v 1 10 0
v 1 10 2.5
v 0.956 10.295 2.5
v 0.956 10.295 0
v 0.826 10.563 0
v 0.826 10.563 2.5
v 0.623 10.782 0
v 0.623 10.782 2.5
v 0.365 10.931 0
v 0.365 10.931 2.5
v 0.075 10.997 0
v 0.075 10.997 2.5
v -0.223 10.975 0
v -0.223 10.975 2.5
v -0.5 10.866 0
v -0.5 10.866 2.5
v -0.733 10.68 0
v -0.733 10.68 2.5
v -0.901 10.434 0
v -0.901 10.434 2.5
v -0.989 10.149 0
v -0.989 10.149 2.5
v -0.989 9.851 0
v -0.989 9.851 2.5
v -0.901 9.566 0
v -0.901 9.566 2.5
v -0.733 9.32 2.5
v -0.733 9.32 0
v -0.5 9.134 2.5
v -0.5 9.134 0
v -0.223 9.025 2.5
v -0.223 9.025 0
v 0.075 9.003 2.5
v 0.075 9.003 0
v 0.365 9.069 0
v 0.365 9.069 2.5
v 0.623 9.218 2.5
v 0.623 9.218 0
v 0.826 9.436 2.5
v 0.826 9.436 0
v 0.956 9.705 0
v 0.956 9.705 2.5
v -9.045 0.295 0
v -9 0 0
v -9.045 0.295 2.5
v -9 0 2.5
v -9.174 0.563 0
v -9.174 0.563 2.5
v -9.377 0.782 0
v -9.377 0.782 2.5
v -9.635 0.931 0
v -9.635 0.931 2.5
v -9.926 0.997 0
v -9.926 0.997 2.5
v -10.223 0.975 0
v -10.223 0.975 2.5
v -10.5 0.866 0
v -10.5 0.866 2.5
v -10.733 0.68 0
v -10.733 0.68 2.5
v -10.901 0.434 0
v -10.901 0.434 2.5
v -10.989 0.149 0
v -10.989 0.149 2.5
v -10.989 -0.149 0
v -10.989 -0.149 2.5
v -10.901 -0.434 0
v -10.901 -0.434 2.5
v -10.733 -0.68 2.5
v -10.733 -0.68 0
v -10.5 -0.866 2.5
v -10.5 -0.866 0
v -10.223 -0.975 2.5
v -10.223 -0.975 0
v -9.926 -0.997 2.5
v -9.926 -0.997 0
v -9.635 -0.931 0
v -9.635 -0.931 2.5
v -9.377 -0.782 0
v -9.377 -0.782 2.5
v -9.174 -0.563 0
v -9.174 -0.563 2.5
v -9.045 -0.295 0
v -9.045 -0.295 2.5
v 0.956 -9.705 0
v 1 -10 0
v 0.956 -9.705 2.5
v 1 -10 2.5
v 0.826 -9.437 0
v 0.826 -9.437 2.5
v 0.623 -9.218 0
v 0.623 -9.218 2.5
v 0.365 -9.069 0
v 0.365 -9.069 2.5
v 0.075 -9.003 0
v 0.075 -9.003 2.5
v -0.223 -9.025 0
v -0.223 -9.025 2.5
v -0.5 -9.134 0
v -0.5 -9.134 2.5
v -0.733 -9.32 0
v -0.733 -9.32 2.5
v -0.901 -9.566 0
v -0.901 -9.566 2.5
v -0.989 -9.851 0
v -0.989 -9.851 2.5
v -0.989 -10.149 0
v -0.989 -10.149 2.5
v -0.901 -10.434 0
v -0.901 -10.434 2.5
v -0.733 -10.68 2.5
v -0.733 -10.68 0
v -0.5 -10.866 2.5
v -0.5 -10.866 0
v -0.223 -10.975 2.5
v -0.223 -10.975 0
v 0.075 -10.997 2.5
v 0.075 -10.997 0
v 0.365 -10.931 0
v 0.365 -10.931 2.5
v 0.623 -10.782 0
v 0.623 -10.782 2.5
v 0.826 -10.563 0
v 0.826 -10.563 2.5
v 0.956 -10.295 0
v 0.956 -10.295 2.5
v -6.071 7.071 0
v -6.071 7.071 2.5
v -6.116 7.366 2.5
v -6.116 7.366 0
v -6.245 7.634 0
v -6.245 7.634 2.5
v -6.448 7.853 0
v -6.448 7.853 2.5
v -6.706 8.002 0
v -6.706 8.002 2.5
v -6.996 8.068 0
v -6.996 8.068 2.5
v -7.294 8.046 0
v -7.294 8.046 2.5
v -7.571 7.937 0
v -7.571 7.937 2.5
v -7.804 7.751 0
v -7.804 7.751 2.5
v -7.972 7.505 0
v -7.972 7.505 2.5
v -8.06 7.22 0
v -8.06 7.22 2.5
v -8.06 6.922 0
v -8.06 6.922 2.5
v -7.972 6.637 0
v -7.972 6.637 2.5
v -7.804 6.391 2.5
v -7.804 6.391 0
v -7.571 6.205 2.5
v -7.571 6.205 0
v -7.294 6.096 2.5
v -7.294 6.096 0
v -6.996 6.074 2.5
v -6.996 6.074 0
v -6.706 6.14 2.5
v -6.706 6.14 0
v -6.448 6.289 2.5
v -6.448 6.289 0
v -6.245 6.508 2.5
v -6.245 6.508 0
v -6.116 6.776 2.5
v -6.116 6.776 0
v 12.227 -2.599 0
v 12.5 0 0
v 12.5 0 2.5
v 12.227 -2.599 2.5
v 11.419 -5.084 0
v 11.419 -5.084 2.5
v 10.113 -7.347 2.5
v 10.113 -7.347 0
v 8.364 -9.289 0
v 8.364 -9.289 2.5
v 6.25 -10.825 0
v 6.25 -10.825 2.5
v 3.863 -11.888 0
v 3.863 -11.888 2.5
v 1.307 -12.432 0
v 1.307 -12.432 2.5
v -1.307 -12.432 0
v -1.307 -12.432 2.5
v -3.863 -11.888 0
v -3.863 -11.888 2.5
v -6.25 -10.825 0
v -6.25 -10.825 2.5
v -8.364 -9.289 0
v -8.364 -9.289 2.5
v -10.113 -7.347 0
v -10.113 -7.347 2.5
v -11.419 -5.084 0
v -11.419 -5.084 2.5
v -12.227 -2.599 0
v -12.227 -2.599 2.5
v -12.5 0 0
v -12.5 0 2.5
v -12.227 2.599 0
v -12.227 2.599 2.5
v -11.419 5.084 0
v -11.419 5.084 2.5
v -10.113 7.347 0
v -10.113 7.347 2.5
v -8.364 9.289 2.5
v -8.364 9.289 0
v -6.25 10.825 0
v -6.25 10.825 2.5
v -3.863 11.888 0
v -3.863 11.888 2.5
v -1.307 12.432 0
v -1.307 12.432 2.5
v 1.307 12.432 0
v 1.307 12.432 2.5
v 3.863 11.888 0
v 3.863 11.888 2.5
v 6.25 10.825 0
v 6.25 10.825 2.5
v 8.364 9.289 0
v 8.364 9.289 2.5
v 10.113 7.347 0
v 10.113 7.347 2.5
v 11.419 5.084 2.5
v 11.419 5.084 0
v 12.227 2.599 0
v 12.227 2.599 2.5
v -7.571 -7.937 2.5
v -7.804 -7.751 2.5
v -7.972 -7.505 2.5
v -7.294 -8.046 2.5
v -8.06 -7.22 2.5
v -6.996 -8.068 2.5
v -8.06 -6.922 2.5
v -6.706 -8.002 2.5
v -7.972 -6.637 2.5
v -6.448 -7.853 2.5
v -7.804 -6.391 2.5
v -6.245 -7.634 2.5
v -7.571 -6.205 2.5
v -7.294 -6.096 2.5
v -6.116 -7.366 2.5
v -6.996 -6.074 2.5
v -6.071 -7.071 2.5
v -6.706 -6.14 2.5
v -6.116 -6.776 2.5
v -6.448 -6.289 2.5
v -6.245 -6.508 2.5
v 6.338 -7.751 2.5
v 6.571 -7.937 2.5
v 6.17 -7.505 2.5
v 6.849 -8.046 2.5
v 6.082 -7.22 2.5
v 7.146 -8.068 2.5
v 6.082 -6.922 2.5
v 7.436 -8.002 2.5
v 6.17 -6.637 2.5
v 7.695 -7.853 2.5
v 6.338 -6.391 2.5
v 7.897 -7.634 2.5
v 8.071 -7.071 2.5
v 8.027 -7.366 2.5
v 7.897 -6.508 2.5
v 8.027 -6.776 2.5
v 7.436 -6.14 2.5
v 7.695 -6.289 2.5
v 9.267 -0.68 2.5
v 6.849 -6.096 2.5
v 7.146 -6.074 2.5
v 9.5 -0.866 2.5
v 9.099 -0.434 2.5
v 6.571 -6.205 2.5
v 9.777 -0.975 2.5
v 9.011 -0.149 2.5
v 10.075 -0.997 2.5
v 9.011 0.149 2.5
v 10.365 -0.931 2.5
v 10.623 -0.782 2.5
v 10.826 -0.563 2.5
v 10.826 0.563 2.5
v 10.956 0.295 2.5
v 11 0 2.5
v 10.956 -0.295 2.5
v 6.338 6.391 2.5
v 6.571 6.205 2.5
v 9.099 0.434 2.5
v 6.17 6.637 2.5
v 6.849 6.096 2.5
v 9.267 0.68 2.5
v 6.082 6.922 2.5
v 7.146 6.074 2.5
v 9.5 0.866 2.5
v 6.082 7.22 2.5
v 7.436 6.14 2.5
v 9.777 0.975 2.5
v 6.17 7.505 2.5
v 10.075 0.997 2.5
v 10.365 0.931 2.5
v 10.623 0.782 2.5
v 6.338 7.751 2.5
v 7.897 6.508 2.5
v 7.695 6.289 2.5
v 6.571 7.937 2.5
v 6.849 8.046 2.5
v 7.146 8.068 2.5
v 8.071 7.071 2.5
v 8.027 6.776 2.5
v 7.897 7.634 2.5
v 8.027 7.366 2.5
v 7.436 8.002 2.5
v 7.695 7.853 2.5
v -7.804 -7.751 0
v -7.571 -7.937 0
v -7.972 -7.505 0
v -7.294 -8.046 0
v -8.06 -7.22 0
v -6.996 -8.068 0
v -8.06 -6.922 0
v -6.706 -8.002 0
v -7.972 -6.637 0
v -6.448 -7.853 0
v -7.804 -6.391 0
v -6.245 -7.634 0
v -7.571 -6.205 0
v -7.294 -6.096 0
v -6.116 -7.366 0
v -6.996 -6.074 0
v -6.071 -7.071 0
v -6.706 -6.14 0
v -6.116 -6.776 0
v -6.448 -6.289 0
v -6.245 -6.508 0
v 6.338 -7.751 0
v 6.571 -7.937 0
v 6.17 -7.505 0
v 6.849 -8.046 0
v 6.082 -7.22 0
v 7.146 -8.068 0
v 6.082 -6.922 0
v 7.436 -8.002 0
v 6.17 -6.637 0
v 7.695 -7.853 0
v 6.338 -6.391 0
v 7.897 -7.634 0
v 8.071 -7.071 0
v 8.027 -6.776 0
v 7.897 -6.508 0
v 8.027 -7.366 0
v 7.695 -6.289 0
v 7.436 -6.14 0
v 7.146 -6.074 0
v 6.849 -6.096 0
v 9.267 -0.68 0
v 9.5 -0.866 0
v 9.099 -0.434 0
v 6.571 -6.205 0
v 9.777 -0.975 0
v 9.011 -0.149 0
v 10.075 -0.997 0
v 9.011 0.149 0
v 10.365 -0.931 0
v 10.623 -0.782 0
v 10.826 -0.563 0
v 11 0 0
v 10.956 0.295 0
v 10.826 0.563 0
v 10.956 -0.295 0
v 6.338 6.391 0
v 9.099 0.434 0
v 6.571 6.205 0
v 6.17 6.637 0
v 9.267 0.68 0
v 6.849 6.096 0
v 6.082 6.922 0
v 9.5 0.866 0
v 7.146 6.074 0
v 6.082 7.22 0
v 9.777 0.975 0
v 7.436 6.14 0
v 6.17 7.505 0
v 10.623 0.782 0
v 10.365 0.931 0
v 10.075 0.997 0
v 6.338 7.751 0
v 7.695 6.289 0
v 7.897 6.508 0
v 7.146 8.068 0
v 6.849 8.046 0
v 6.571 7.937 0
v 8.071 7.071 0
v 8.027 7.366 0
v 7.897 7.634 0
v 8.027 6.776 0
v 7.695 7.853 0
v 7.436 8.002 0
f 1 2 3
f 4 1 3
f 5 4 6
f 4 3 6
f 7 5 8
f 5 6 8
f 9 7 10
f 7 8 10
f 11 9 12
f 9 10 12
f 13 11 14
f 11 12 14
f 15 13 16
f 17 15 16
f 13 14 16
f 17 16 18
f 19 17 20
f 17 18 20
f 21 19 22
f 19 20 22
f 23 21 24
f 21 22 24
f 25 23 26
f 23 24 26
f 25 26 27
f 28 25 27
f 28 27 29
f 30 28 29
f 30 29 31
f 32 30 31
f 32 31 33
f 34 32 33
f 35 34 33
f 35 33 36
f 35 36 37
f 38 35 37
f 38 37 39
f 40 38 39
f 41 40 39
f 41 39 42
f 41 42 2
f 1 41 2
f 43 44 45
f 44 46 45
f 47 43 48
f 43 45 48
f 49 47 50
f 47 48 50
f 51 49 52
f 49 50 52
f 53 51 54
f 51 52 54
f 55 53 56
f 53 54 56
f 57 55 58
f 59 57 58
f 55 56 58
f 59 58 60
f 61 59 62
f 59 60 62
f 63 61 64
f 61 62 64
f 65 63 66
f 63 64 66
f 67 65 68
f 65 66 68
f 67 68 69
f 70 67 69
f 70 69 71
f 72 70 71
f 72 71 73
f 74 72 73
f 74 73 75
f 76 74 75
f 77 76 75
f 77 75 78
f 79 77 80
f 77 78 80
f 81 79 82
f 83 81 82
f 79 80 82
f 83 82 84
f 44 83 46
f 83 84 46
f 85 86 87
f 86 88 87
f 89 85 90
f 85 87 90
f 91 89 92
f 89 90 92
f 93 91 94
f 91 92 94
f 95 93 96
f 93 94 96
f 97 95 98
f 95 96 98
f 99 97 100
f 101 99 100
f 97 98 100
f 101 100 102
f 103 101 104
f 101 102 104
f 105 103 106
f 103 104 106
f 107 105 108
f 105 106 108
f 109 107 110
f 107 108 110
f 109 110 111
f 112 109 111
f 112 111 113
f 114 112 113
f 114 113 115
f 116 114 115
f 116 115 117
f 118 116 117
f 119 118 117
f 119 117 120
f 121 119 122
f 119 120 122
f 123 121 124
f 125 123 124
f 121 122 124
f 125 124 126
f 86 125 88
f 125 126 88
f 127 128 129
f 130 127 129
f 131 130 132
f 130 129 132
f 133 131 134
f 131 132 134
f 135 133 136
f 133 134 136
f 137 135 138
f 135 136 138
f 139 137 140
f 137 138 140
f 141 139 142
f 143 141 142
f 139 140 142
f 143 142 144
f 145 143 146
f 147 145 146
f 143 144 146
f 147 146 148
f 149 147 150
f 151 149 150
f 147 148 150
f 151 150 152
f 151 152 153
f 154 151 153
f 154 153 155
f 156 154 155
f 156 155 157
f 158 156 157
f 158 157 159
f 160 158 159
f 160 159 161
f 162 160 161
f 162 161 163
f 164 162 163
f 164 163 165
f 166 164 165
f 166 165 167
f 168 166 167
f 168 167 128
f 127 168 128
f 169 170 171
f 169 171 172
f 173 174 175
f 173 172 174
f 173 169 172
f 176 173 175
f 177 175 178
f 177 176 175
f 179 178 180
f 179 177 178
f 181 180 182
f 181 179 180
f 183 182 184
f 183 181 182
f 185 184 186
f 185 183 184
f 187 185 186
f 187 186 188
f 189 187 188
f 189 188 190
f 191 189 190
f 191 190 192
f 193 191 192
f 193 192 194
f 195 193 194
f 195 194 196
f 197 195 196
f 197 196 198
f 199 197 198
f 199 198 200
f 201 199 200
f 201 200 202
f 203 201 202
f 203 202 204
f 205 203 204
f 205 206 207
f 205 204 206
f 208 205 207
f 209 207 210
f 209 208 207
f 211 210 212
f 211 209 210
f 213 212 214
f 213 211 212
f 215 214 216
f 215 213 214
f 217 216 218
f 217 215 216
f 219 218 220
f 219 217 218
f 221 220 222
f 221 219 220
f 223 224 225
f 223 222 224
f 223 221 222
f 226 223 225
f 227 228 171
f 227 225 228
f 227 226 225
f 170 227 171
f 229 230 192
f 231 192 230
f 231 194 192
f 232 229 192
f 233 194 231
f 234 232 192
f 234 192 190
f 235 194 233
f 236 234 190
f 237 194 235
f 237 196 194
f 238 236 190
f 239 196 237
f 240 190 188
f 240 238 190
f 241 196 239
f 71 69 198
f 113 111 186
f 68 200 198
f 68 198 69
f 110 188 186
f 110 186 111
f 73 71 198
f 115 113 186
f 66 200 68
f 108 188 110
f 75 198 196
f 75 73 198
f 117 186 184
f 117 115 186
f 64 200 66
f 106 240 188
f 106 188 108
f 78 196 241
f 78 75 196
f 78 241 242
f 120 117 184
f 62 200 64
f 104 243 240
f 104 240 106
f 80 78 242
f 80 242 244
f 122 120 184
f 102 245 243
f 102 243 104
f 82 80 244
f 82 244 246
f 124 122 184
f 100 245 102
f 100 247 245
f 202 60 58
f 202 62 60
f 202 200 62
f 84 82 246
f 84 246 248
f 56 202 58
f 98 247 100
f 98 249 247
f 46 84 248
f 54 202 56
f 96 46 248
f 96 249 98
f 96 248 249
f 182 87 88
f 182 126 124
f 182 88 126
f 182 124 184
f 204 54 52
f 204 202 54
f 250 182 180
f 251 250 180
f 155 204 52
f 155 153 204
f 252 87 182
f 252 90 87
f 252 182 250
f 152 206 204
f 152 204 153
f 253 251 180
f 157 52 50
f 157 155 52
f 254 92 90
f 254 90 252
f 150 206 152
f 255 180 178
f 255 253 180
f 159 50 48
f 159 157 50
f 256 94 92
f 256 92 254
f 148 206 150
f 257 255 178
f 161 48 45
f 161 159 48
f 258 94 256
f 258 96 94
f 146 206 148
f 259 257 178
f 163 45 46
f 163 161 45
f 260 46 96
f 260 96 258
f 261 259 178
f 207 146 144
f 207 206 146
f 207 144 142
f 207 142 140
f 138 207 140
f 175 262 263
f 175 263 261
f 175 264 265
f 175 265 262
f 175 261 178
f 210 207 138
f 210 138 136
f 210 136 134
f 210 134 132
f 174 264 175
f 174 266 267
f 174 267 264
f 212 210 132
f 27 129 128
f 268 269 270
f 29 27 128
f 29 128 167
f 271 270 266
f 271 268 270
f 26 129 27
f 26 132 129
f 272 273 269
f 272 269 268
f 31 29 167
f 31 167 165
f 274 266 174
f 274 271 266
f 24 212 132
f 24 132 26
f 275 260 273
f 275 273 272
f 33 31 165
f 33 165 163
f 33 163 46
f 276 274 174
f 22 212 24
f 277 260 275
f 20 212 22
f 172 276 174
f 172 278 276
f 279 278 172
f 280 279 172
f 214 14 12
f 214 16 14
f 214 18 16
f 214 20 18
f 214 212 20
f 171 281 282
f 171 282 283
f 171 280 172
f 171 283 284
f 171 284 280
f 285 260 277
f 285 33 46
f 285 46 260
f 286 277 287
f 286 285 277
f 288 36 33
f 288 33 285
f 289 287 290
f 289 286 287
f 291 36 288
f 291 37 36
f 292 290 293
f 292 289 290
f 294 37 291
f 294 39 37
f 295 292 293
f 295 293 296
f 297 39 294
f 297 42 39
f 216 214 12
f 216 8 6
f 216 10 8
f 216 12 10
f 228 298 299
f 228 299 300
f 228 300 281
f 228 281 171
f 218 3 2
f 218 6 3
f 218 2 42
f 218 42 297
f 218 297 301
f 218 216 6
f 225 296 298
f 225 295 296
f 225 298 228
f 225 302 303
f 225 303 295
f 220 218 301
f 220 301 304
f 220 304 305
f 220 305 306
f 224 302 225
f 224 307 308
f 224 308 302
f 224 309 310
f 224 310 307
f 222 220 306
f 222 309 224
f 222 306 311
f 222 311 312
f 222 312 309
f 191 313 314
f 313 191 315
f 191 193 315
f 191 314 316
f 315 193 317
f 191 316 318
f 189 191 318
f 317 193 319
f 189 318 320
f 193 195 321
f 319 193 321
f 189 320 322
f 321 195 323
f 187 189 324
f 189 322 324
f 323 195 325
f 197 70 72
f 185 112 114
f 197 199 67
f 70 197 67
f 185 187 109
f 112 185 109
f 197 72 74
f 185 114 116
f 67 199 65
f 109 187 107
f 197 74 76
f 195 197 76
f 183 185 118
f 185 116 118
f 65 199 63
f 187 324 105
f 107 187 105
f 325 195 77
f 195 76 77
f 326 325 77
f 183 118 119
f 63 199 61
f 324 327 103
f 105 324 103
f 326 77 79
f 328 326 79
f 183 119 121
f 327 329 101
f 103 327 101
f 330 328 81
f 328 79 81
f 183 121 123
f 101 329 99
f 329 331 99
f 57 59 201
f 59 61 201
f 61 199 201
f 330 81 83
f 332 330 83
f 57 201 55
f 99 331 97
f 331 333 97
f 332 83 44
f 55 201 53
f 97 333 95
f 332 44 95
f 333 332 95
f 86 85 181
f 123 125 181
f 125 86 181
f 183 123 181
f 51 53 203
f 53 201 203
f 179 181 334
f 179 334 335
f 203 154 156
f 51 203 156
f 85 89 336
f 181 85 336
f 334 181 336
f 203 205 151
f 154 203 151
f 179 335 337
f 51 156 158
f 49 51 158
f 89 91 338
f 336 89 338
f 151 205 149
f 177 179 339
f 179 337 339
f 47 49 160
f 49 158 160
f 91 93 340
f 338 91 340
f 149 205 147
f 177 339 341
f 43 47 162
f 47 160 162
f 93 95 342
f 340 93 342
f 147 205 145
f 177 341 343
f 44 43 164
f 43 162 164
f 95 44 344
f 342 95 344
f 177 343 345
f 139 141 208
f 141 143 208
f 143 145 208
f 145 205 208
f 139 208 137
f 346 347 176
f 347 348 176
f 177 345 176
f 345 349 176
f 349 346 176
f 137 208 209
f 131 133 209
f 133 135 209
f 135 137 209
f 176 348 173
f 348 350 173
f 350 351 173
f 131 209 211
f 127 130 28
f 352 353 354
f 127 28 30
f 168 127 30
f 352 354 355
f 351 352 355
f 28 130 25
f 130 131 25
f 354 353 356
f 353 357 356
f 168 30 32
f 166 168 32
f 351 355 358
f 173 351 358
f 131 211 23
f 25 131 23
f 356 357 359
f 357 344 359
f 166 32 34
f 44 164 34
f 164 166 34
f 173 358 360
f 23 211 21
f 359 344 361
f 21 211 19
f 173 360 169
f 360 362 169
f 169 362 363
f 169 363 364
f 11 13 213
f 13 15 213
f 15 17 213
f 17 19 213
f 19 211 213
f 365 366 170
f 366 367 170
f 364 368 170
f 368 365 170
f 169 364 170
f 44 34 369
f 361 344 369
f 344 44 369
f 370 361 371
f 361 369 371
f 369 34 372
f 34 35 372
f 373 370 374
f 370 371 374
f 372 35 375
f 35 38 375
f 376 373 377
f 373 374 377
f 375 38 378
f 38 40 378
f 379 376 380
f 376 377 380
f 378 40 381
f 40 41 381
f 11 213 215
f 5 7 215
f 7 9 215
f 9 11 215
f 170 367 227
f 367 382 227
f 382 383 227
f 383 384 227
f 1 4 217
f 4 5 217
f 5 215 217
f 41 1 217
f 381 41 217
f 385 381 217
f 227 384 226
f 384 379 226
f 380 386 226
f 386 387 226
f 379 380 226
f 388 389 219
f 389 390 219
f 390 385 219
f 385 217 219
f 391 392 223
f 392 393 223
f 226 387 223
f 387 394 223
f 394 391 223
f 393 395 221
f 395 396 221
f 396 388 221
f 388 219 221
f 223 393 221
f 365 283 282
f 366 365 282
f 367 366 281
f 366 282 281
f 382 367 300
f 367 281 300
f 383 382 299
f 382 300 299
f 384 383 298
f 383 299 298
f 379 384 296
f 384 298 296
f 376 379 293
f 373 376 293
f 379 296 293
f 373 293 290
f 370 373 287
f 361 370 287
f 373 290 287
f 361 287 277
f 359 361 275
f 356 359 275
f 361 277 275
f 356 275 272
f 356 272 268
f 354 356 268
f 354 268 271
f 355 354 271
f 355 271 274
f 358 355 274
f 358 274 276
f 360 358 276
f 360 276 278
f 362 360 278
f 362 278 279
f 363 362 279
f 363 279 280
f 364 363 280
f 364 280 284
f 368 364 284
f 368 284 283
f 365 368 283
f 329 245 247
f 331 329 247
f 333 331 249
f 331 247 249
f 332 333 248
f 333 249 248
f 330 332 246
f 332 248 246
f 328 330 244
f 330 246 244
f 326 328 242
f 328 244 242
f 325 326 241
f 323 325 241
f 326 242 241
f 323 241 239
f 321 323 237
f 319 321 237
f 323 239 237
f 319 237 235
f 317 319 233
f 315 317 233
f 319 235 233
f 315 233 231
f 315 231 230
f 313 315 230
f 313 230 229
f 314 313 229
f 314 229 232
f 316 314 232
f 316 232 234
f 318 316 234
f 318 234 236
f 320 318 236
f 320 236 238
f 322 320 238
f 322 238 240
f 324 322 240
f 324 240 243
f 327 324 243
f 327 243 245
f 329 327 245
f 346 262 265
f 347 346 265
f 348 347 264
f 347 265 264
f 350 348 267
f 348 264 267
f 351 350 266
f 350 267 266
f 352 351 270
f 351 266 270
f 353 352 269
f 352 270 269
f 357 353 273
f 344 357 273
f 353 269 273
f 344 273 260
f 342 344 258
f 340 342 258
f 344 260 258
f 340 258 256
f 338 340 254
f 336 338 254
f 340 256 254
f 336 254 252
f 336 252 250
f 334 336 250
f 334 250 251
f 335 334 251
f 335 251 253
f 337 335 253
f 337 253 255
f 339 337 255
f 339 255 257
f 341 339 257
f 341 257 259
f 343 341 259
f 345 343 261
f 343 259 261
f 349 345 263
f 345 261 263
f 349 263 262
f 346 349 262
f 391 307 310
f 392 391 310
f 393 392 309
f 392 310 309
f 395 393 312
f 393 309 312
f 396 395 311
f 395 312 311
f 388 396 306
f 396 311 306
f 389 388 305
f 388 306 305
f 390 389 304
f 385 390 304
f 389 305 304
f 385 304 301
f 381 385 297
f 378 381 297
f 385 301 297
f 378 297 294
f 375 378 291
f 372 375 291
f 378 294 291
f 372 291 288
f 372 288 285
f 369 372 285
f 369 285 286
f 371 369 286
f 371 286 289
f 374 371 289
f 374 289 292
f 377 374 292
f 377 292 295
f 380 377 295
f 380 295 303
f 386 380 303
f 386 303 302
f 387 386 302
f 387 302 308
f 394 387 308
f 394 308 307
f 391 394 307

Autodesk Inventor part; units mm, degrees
ref_plane "YZ Plane" through (0, 0, 0) normal (1, 0, 0) x (0, 1, 0)
ref_plane "XZ Plane" through (0, 0, 0) normal (0, 1, 0) x (-1, 0, 0)
ref_plane "XY Plane" through (0, 0, 0) normal (0, 0, 1) x (1, 0, 0)
sketch "スケッチ1" plane through (0, 0, 0) normal (0, 0, 1) x (1, 0, 0)
  circle A0 centre (0, 0) radius 12.5
  dimension "d0" = 25
extrude "押し出し1" add sketch "スケッチ1" along normal blind 2.5
sketch "スケッチ2" plane through (0, 0, 2.5) normal (0, 0, 1) x (1, 0, 0)
  line L0 (0, 0) -> (0, 10)
  dimension "d3" = 10
sketch "スケッチ3" plane through (0, 0, 2.5) normal (0, 0, 1) x (1, 0, 0)
  circle A0 centre (0, 9.9998) radius 1
  line L0 (0, 0) -> (0, -10)
  dimension "d4" = 2
  dimension "d5" = 10
sketch "スケッチ4" plane through (0, 0, 2.5) normal (0, 0, 1) x (1, 0, 0)
  circle A0 centre (0, -10) radius 1
  point P0 (0, 0)
  dimension "d6" = 2
sketch "スケッチ5" plane through (0, 0, 2.5) normal (0, 0, 1) x (1, 0, 0)
  line L0 (0, 0) -> (-10, 0)
  dimension "d7" = 10
sketch "スケッチ6" plane through (0, 0, 2.5) normal (0, 0, 1) x (1, 0, 0)
  circle A0 centre (-10.0003, 0) radius 1
  line L0 (0, 0) -> (10, 0)
  circle A1 centre (10, 0) radius 1
  dimension "d8" = 2
  dimension "d9" = 10
  dimension "d10" = 2
extrude "押し出し2" cut sketch "スケッチ3" against normal blind 2.5
extrude "押し出し3" cut sketch "スケッチ6" against normal blind 2.5
extrude "押し出し4" cut sketch "スケッチ4" against normal blind 2.5
sketch "スケッチ7" plane through (0, 0, 2.5) normal (0, 0, 1) x (1, 0, 0)
  line L0 (0, 0) -> (7.0711, 7.0711)
  line L1 (0, 0) -> (10, 0) construction
  line L2 (0, 0) -> (-7.0711, 7.0711)
  line L3 (0, 0) -> (10, 0) construction
  circle A0 centre (-7.0711, 7.0711) radius 1
  circle A1 centre (7.0711, 7.0711) radius 1
  dimension "d17" = 10
  dimension "d18" = 45
  dimension "d19" = 10
  dimension "d20" = 135
  dimension "d21" = 2
  dimension "d22" = 2
sketch "スケッチ8" plane through (0, 0, 2.5) normal (0, 0, 1) x (1, 0, 0)
  line L0 (0, 0) -> (-7.0711, -7.0711)
  line L1 (0, 0) -> (10, 0) construction
  circle A0 centre (-7.0711, -7.0711) radius 1
  line L2 (0, 0) -> (7.0711, -7.0711)
  line L3 (0, 0) -> (10, 0) construction
  circle A1 centre (7.0711, -7.0711) radius 1
  dimension "d23" = 10
  dimension "d24" = 135
  dimension "d25" = 2
  dimension "d26" = 10
  dimension "d27" = 45
  dimension "d28" = 2
extrude "押し出し5" cut sketch "スケッチ7" against normal blind 2.5
extrude "押し出し6" cut sketch "スケッチ8" against normal blind 2.5
sketch "スケッチ9" plane through (0, 0, 2.5) normal (0, 0, 1) x (1, 0, 0)
  point P0 (0, 0)
properties part number "Slit_disk"
